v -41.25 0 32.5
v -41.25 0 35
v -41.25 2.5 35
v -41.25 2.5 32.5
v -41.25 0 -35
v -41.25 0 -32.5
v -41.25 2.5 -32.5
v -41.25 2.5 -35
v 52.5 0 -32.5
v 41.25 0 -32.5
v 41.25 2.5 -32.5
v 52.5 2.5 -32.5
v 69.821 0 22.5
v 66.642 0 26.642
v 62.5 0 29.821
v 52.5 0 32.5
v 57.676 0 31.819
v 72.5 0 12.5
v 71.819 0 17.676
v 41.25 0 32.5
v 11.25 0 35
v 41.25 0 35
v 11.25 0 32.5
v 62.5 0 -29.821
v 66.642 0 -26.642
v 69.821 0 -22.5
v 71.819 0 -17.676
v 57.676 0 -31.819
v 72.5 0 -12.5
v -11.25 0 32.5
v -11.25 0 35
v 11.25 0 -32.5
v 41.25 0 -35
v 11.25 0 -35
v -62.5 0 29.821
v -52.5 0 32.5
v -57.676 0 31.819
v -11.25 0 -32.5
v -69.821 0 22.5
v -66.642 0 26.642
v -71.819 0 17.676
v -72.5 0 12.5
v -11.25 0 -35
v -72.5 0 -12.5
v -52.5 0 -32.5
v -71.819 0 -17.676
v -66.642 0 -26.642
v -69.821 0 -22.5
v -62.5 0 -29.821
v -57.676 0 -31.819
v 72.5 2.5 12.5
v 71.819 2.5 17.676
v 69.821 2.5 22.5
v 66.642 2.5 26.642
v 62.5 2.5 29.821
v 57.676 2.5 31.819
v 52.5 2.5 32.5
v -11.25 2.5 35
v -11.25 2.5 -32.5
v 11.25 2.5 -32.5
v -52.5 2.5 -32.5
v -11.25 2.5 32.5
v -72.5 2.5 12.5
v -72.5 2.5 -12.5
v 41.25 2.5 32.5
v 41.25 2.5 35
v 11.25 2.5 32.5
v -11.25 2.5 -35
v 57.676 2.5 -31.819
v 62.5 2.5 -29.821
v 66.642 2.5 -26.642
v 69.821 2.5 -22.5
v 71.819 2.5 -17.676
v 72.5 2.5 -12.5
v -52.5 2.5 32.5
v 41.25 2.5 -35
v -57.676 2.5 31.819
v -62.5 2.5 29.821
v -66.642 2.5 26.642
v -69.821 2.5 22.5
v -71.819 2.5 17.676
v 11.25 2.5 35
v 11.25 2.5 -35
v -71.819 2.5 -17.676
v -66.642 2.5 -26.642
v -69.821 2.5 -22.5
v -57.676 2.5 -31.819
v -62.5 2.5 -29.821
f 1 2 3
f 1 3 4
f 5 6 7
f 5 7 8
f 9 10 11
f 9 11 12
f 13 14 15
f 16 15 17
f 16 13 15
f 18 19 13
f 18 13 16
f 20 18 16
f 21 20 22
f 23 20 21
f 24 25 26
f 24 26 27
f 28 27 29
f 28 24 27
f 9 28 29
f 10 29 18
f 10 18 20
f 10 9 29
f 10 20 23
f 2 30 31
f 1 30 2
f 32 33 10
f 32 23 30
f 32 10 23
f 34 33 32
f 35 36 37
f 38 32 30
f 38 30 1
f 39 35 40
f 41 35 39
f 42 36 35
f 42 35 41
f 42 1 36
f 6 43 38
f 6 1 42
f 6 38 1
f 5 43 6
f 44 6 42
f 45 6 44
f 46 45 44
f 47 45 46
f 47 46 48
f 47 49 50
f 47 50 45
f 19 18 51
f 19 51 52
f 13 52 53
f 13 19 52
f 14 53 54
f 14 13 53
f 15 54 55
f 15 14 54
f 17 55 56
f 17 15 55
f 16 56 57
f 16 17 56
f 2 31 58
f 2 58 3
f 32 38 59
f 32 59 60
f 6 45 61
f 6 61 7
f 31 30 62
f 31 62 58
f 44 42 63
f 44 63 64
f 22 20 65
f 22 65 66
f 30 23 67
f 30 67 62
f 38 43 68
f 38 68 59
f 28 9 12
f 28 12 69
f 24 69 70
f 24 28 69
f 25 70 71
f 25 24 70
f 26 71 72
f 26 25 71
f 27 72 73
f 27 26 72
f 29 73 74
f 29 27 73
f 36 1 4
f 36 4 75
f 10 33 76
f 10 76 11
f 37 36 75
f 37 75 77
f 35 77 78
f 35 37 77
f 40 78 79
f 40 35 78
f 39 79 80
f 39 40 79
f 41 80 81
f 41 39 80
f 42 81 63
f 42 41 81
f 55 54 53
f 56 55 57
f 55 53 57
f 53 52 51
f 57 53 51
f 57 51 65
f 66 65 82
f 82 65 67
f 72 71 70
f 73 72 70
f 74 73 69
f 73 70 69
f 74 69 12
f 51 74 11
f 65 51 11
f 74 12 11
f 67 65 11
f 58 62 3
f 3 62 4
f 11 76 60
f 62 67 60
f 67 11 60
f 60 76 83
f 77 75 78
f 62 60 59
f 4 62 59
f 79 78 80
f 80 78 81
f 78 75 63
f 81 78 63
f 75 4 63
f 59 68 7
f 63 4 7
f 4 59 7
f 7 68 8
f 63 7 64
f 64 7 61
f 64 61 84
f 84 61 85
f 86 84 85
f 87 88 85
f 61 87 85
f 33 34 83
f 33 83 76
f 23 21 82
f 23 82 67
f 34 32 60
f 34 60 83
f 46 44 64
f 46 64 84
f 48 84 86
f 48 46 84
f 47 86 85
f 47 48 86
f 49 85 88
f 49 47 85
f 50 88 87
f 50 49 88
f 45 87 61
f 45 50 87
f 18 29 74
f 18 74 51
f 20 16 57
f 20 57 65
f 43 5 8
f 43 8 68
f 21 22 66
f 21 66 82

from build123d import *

# Parameters (mm, degrees)
BOSS_EXTRUDE2_DEPTH = 2.5


with BuildPart() as part:
    # Sketch1 → Boss-Extrude2 (new body)
    with BuildSketch(Plane(origin=(0, 0, 0), x_dir=(1, 0, 0), z_dir=(0, 1, 0))):
        with BuildLine():
            Line((-52.5, 32.5), (-41.25, 32.5))
            Line((-41.25, 32.5), (-41.25, 35))
            Line((-41.25, 35), (-11.25, 35))
            Line((-11.25, 35), (-11.25, 32.5))
            Line((-11.25, 32.5), (11.25, 32.5))
            Line((11.25, 32.5), (11.25, 35))
            Line((11.25, 35), (41.25, 35))
            Line((41.25, 35), (41.25, 32.5))
            Line((41.25, 32.5), (52.5, 32.5))
            ThreePointArc((52.5, 32.5), (66.642135624, 26.642135624), (72.5, 12.5))
            Line((72.5, 12.5), (72.5, -12.5))
            ThreePointArc((72.5, -12.5), (66.642135624, -26.642135624), (52.5, -32.5))
            Line((52.5, -32.5), (41.25, -32.5))
            Line((41.25, -32.5), (41.25, -35))
            Line((41.25, -35), (11.25, -35))
            Line((11.25, -35), (11.25, -32.5))
            Line((11.25, -32.5), (-11.25, -32.5))
            Line((-11.25, -32.5), (-11.25, -35))
            Line((-11.25, -35), (-41.25, -35))
            Line((-41.25, -35), (-41.25, -32.5))
            Line((-41.25, -32.5), (-52.5, -32.5))
            ThreePointArc((-52.5, -32.5), (-66.642135624, -26.642135624), (-72.5, -12.5))
            Line((-72.5, -12.5), (-72.5, 12.5))
            ThreePointArc((-72.5, 12.5), (-66.642135624, 26.642135624), (-52.5, 32.5))
        make_face()
    extrude(amount=BOSS_EXTRUDE2_DEPTH)


solid = part.part
